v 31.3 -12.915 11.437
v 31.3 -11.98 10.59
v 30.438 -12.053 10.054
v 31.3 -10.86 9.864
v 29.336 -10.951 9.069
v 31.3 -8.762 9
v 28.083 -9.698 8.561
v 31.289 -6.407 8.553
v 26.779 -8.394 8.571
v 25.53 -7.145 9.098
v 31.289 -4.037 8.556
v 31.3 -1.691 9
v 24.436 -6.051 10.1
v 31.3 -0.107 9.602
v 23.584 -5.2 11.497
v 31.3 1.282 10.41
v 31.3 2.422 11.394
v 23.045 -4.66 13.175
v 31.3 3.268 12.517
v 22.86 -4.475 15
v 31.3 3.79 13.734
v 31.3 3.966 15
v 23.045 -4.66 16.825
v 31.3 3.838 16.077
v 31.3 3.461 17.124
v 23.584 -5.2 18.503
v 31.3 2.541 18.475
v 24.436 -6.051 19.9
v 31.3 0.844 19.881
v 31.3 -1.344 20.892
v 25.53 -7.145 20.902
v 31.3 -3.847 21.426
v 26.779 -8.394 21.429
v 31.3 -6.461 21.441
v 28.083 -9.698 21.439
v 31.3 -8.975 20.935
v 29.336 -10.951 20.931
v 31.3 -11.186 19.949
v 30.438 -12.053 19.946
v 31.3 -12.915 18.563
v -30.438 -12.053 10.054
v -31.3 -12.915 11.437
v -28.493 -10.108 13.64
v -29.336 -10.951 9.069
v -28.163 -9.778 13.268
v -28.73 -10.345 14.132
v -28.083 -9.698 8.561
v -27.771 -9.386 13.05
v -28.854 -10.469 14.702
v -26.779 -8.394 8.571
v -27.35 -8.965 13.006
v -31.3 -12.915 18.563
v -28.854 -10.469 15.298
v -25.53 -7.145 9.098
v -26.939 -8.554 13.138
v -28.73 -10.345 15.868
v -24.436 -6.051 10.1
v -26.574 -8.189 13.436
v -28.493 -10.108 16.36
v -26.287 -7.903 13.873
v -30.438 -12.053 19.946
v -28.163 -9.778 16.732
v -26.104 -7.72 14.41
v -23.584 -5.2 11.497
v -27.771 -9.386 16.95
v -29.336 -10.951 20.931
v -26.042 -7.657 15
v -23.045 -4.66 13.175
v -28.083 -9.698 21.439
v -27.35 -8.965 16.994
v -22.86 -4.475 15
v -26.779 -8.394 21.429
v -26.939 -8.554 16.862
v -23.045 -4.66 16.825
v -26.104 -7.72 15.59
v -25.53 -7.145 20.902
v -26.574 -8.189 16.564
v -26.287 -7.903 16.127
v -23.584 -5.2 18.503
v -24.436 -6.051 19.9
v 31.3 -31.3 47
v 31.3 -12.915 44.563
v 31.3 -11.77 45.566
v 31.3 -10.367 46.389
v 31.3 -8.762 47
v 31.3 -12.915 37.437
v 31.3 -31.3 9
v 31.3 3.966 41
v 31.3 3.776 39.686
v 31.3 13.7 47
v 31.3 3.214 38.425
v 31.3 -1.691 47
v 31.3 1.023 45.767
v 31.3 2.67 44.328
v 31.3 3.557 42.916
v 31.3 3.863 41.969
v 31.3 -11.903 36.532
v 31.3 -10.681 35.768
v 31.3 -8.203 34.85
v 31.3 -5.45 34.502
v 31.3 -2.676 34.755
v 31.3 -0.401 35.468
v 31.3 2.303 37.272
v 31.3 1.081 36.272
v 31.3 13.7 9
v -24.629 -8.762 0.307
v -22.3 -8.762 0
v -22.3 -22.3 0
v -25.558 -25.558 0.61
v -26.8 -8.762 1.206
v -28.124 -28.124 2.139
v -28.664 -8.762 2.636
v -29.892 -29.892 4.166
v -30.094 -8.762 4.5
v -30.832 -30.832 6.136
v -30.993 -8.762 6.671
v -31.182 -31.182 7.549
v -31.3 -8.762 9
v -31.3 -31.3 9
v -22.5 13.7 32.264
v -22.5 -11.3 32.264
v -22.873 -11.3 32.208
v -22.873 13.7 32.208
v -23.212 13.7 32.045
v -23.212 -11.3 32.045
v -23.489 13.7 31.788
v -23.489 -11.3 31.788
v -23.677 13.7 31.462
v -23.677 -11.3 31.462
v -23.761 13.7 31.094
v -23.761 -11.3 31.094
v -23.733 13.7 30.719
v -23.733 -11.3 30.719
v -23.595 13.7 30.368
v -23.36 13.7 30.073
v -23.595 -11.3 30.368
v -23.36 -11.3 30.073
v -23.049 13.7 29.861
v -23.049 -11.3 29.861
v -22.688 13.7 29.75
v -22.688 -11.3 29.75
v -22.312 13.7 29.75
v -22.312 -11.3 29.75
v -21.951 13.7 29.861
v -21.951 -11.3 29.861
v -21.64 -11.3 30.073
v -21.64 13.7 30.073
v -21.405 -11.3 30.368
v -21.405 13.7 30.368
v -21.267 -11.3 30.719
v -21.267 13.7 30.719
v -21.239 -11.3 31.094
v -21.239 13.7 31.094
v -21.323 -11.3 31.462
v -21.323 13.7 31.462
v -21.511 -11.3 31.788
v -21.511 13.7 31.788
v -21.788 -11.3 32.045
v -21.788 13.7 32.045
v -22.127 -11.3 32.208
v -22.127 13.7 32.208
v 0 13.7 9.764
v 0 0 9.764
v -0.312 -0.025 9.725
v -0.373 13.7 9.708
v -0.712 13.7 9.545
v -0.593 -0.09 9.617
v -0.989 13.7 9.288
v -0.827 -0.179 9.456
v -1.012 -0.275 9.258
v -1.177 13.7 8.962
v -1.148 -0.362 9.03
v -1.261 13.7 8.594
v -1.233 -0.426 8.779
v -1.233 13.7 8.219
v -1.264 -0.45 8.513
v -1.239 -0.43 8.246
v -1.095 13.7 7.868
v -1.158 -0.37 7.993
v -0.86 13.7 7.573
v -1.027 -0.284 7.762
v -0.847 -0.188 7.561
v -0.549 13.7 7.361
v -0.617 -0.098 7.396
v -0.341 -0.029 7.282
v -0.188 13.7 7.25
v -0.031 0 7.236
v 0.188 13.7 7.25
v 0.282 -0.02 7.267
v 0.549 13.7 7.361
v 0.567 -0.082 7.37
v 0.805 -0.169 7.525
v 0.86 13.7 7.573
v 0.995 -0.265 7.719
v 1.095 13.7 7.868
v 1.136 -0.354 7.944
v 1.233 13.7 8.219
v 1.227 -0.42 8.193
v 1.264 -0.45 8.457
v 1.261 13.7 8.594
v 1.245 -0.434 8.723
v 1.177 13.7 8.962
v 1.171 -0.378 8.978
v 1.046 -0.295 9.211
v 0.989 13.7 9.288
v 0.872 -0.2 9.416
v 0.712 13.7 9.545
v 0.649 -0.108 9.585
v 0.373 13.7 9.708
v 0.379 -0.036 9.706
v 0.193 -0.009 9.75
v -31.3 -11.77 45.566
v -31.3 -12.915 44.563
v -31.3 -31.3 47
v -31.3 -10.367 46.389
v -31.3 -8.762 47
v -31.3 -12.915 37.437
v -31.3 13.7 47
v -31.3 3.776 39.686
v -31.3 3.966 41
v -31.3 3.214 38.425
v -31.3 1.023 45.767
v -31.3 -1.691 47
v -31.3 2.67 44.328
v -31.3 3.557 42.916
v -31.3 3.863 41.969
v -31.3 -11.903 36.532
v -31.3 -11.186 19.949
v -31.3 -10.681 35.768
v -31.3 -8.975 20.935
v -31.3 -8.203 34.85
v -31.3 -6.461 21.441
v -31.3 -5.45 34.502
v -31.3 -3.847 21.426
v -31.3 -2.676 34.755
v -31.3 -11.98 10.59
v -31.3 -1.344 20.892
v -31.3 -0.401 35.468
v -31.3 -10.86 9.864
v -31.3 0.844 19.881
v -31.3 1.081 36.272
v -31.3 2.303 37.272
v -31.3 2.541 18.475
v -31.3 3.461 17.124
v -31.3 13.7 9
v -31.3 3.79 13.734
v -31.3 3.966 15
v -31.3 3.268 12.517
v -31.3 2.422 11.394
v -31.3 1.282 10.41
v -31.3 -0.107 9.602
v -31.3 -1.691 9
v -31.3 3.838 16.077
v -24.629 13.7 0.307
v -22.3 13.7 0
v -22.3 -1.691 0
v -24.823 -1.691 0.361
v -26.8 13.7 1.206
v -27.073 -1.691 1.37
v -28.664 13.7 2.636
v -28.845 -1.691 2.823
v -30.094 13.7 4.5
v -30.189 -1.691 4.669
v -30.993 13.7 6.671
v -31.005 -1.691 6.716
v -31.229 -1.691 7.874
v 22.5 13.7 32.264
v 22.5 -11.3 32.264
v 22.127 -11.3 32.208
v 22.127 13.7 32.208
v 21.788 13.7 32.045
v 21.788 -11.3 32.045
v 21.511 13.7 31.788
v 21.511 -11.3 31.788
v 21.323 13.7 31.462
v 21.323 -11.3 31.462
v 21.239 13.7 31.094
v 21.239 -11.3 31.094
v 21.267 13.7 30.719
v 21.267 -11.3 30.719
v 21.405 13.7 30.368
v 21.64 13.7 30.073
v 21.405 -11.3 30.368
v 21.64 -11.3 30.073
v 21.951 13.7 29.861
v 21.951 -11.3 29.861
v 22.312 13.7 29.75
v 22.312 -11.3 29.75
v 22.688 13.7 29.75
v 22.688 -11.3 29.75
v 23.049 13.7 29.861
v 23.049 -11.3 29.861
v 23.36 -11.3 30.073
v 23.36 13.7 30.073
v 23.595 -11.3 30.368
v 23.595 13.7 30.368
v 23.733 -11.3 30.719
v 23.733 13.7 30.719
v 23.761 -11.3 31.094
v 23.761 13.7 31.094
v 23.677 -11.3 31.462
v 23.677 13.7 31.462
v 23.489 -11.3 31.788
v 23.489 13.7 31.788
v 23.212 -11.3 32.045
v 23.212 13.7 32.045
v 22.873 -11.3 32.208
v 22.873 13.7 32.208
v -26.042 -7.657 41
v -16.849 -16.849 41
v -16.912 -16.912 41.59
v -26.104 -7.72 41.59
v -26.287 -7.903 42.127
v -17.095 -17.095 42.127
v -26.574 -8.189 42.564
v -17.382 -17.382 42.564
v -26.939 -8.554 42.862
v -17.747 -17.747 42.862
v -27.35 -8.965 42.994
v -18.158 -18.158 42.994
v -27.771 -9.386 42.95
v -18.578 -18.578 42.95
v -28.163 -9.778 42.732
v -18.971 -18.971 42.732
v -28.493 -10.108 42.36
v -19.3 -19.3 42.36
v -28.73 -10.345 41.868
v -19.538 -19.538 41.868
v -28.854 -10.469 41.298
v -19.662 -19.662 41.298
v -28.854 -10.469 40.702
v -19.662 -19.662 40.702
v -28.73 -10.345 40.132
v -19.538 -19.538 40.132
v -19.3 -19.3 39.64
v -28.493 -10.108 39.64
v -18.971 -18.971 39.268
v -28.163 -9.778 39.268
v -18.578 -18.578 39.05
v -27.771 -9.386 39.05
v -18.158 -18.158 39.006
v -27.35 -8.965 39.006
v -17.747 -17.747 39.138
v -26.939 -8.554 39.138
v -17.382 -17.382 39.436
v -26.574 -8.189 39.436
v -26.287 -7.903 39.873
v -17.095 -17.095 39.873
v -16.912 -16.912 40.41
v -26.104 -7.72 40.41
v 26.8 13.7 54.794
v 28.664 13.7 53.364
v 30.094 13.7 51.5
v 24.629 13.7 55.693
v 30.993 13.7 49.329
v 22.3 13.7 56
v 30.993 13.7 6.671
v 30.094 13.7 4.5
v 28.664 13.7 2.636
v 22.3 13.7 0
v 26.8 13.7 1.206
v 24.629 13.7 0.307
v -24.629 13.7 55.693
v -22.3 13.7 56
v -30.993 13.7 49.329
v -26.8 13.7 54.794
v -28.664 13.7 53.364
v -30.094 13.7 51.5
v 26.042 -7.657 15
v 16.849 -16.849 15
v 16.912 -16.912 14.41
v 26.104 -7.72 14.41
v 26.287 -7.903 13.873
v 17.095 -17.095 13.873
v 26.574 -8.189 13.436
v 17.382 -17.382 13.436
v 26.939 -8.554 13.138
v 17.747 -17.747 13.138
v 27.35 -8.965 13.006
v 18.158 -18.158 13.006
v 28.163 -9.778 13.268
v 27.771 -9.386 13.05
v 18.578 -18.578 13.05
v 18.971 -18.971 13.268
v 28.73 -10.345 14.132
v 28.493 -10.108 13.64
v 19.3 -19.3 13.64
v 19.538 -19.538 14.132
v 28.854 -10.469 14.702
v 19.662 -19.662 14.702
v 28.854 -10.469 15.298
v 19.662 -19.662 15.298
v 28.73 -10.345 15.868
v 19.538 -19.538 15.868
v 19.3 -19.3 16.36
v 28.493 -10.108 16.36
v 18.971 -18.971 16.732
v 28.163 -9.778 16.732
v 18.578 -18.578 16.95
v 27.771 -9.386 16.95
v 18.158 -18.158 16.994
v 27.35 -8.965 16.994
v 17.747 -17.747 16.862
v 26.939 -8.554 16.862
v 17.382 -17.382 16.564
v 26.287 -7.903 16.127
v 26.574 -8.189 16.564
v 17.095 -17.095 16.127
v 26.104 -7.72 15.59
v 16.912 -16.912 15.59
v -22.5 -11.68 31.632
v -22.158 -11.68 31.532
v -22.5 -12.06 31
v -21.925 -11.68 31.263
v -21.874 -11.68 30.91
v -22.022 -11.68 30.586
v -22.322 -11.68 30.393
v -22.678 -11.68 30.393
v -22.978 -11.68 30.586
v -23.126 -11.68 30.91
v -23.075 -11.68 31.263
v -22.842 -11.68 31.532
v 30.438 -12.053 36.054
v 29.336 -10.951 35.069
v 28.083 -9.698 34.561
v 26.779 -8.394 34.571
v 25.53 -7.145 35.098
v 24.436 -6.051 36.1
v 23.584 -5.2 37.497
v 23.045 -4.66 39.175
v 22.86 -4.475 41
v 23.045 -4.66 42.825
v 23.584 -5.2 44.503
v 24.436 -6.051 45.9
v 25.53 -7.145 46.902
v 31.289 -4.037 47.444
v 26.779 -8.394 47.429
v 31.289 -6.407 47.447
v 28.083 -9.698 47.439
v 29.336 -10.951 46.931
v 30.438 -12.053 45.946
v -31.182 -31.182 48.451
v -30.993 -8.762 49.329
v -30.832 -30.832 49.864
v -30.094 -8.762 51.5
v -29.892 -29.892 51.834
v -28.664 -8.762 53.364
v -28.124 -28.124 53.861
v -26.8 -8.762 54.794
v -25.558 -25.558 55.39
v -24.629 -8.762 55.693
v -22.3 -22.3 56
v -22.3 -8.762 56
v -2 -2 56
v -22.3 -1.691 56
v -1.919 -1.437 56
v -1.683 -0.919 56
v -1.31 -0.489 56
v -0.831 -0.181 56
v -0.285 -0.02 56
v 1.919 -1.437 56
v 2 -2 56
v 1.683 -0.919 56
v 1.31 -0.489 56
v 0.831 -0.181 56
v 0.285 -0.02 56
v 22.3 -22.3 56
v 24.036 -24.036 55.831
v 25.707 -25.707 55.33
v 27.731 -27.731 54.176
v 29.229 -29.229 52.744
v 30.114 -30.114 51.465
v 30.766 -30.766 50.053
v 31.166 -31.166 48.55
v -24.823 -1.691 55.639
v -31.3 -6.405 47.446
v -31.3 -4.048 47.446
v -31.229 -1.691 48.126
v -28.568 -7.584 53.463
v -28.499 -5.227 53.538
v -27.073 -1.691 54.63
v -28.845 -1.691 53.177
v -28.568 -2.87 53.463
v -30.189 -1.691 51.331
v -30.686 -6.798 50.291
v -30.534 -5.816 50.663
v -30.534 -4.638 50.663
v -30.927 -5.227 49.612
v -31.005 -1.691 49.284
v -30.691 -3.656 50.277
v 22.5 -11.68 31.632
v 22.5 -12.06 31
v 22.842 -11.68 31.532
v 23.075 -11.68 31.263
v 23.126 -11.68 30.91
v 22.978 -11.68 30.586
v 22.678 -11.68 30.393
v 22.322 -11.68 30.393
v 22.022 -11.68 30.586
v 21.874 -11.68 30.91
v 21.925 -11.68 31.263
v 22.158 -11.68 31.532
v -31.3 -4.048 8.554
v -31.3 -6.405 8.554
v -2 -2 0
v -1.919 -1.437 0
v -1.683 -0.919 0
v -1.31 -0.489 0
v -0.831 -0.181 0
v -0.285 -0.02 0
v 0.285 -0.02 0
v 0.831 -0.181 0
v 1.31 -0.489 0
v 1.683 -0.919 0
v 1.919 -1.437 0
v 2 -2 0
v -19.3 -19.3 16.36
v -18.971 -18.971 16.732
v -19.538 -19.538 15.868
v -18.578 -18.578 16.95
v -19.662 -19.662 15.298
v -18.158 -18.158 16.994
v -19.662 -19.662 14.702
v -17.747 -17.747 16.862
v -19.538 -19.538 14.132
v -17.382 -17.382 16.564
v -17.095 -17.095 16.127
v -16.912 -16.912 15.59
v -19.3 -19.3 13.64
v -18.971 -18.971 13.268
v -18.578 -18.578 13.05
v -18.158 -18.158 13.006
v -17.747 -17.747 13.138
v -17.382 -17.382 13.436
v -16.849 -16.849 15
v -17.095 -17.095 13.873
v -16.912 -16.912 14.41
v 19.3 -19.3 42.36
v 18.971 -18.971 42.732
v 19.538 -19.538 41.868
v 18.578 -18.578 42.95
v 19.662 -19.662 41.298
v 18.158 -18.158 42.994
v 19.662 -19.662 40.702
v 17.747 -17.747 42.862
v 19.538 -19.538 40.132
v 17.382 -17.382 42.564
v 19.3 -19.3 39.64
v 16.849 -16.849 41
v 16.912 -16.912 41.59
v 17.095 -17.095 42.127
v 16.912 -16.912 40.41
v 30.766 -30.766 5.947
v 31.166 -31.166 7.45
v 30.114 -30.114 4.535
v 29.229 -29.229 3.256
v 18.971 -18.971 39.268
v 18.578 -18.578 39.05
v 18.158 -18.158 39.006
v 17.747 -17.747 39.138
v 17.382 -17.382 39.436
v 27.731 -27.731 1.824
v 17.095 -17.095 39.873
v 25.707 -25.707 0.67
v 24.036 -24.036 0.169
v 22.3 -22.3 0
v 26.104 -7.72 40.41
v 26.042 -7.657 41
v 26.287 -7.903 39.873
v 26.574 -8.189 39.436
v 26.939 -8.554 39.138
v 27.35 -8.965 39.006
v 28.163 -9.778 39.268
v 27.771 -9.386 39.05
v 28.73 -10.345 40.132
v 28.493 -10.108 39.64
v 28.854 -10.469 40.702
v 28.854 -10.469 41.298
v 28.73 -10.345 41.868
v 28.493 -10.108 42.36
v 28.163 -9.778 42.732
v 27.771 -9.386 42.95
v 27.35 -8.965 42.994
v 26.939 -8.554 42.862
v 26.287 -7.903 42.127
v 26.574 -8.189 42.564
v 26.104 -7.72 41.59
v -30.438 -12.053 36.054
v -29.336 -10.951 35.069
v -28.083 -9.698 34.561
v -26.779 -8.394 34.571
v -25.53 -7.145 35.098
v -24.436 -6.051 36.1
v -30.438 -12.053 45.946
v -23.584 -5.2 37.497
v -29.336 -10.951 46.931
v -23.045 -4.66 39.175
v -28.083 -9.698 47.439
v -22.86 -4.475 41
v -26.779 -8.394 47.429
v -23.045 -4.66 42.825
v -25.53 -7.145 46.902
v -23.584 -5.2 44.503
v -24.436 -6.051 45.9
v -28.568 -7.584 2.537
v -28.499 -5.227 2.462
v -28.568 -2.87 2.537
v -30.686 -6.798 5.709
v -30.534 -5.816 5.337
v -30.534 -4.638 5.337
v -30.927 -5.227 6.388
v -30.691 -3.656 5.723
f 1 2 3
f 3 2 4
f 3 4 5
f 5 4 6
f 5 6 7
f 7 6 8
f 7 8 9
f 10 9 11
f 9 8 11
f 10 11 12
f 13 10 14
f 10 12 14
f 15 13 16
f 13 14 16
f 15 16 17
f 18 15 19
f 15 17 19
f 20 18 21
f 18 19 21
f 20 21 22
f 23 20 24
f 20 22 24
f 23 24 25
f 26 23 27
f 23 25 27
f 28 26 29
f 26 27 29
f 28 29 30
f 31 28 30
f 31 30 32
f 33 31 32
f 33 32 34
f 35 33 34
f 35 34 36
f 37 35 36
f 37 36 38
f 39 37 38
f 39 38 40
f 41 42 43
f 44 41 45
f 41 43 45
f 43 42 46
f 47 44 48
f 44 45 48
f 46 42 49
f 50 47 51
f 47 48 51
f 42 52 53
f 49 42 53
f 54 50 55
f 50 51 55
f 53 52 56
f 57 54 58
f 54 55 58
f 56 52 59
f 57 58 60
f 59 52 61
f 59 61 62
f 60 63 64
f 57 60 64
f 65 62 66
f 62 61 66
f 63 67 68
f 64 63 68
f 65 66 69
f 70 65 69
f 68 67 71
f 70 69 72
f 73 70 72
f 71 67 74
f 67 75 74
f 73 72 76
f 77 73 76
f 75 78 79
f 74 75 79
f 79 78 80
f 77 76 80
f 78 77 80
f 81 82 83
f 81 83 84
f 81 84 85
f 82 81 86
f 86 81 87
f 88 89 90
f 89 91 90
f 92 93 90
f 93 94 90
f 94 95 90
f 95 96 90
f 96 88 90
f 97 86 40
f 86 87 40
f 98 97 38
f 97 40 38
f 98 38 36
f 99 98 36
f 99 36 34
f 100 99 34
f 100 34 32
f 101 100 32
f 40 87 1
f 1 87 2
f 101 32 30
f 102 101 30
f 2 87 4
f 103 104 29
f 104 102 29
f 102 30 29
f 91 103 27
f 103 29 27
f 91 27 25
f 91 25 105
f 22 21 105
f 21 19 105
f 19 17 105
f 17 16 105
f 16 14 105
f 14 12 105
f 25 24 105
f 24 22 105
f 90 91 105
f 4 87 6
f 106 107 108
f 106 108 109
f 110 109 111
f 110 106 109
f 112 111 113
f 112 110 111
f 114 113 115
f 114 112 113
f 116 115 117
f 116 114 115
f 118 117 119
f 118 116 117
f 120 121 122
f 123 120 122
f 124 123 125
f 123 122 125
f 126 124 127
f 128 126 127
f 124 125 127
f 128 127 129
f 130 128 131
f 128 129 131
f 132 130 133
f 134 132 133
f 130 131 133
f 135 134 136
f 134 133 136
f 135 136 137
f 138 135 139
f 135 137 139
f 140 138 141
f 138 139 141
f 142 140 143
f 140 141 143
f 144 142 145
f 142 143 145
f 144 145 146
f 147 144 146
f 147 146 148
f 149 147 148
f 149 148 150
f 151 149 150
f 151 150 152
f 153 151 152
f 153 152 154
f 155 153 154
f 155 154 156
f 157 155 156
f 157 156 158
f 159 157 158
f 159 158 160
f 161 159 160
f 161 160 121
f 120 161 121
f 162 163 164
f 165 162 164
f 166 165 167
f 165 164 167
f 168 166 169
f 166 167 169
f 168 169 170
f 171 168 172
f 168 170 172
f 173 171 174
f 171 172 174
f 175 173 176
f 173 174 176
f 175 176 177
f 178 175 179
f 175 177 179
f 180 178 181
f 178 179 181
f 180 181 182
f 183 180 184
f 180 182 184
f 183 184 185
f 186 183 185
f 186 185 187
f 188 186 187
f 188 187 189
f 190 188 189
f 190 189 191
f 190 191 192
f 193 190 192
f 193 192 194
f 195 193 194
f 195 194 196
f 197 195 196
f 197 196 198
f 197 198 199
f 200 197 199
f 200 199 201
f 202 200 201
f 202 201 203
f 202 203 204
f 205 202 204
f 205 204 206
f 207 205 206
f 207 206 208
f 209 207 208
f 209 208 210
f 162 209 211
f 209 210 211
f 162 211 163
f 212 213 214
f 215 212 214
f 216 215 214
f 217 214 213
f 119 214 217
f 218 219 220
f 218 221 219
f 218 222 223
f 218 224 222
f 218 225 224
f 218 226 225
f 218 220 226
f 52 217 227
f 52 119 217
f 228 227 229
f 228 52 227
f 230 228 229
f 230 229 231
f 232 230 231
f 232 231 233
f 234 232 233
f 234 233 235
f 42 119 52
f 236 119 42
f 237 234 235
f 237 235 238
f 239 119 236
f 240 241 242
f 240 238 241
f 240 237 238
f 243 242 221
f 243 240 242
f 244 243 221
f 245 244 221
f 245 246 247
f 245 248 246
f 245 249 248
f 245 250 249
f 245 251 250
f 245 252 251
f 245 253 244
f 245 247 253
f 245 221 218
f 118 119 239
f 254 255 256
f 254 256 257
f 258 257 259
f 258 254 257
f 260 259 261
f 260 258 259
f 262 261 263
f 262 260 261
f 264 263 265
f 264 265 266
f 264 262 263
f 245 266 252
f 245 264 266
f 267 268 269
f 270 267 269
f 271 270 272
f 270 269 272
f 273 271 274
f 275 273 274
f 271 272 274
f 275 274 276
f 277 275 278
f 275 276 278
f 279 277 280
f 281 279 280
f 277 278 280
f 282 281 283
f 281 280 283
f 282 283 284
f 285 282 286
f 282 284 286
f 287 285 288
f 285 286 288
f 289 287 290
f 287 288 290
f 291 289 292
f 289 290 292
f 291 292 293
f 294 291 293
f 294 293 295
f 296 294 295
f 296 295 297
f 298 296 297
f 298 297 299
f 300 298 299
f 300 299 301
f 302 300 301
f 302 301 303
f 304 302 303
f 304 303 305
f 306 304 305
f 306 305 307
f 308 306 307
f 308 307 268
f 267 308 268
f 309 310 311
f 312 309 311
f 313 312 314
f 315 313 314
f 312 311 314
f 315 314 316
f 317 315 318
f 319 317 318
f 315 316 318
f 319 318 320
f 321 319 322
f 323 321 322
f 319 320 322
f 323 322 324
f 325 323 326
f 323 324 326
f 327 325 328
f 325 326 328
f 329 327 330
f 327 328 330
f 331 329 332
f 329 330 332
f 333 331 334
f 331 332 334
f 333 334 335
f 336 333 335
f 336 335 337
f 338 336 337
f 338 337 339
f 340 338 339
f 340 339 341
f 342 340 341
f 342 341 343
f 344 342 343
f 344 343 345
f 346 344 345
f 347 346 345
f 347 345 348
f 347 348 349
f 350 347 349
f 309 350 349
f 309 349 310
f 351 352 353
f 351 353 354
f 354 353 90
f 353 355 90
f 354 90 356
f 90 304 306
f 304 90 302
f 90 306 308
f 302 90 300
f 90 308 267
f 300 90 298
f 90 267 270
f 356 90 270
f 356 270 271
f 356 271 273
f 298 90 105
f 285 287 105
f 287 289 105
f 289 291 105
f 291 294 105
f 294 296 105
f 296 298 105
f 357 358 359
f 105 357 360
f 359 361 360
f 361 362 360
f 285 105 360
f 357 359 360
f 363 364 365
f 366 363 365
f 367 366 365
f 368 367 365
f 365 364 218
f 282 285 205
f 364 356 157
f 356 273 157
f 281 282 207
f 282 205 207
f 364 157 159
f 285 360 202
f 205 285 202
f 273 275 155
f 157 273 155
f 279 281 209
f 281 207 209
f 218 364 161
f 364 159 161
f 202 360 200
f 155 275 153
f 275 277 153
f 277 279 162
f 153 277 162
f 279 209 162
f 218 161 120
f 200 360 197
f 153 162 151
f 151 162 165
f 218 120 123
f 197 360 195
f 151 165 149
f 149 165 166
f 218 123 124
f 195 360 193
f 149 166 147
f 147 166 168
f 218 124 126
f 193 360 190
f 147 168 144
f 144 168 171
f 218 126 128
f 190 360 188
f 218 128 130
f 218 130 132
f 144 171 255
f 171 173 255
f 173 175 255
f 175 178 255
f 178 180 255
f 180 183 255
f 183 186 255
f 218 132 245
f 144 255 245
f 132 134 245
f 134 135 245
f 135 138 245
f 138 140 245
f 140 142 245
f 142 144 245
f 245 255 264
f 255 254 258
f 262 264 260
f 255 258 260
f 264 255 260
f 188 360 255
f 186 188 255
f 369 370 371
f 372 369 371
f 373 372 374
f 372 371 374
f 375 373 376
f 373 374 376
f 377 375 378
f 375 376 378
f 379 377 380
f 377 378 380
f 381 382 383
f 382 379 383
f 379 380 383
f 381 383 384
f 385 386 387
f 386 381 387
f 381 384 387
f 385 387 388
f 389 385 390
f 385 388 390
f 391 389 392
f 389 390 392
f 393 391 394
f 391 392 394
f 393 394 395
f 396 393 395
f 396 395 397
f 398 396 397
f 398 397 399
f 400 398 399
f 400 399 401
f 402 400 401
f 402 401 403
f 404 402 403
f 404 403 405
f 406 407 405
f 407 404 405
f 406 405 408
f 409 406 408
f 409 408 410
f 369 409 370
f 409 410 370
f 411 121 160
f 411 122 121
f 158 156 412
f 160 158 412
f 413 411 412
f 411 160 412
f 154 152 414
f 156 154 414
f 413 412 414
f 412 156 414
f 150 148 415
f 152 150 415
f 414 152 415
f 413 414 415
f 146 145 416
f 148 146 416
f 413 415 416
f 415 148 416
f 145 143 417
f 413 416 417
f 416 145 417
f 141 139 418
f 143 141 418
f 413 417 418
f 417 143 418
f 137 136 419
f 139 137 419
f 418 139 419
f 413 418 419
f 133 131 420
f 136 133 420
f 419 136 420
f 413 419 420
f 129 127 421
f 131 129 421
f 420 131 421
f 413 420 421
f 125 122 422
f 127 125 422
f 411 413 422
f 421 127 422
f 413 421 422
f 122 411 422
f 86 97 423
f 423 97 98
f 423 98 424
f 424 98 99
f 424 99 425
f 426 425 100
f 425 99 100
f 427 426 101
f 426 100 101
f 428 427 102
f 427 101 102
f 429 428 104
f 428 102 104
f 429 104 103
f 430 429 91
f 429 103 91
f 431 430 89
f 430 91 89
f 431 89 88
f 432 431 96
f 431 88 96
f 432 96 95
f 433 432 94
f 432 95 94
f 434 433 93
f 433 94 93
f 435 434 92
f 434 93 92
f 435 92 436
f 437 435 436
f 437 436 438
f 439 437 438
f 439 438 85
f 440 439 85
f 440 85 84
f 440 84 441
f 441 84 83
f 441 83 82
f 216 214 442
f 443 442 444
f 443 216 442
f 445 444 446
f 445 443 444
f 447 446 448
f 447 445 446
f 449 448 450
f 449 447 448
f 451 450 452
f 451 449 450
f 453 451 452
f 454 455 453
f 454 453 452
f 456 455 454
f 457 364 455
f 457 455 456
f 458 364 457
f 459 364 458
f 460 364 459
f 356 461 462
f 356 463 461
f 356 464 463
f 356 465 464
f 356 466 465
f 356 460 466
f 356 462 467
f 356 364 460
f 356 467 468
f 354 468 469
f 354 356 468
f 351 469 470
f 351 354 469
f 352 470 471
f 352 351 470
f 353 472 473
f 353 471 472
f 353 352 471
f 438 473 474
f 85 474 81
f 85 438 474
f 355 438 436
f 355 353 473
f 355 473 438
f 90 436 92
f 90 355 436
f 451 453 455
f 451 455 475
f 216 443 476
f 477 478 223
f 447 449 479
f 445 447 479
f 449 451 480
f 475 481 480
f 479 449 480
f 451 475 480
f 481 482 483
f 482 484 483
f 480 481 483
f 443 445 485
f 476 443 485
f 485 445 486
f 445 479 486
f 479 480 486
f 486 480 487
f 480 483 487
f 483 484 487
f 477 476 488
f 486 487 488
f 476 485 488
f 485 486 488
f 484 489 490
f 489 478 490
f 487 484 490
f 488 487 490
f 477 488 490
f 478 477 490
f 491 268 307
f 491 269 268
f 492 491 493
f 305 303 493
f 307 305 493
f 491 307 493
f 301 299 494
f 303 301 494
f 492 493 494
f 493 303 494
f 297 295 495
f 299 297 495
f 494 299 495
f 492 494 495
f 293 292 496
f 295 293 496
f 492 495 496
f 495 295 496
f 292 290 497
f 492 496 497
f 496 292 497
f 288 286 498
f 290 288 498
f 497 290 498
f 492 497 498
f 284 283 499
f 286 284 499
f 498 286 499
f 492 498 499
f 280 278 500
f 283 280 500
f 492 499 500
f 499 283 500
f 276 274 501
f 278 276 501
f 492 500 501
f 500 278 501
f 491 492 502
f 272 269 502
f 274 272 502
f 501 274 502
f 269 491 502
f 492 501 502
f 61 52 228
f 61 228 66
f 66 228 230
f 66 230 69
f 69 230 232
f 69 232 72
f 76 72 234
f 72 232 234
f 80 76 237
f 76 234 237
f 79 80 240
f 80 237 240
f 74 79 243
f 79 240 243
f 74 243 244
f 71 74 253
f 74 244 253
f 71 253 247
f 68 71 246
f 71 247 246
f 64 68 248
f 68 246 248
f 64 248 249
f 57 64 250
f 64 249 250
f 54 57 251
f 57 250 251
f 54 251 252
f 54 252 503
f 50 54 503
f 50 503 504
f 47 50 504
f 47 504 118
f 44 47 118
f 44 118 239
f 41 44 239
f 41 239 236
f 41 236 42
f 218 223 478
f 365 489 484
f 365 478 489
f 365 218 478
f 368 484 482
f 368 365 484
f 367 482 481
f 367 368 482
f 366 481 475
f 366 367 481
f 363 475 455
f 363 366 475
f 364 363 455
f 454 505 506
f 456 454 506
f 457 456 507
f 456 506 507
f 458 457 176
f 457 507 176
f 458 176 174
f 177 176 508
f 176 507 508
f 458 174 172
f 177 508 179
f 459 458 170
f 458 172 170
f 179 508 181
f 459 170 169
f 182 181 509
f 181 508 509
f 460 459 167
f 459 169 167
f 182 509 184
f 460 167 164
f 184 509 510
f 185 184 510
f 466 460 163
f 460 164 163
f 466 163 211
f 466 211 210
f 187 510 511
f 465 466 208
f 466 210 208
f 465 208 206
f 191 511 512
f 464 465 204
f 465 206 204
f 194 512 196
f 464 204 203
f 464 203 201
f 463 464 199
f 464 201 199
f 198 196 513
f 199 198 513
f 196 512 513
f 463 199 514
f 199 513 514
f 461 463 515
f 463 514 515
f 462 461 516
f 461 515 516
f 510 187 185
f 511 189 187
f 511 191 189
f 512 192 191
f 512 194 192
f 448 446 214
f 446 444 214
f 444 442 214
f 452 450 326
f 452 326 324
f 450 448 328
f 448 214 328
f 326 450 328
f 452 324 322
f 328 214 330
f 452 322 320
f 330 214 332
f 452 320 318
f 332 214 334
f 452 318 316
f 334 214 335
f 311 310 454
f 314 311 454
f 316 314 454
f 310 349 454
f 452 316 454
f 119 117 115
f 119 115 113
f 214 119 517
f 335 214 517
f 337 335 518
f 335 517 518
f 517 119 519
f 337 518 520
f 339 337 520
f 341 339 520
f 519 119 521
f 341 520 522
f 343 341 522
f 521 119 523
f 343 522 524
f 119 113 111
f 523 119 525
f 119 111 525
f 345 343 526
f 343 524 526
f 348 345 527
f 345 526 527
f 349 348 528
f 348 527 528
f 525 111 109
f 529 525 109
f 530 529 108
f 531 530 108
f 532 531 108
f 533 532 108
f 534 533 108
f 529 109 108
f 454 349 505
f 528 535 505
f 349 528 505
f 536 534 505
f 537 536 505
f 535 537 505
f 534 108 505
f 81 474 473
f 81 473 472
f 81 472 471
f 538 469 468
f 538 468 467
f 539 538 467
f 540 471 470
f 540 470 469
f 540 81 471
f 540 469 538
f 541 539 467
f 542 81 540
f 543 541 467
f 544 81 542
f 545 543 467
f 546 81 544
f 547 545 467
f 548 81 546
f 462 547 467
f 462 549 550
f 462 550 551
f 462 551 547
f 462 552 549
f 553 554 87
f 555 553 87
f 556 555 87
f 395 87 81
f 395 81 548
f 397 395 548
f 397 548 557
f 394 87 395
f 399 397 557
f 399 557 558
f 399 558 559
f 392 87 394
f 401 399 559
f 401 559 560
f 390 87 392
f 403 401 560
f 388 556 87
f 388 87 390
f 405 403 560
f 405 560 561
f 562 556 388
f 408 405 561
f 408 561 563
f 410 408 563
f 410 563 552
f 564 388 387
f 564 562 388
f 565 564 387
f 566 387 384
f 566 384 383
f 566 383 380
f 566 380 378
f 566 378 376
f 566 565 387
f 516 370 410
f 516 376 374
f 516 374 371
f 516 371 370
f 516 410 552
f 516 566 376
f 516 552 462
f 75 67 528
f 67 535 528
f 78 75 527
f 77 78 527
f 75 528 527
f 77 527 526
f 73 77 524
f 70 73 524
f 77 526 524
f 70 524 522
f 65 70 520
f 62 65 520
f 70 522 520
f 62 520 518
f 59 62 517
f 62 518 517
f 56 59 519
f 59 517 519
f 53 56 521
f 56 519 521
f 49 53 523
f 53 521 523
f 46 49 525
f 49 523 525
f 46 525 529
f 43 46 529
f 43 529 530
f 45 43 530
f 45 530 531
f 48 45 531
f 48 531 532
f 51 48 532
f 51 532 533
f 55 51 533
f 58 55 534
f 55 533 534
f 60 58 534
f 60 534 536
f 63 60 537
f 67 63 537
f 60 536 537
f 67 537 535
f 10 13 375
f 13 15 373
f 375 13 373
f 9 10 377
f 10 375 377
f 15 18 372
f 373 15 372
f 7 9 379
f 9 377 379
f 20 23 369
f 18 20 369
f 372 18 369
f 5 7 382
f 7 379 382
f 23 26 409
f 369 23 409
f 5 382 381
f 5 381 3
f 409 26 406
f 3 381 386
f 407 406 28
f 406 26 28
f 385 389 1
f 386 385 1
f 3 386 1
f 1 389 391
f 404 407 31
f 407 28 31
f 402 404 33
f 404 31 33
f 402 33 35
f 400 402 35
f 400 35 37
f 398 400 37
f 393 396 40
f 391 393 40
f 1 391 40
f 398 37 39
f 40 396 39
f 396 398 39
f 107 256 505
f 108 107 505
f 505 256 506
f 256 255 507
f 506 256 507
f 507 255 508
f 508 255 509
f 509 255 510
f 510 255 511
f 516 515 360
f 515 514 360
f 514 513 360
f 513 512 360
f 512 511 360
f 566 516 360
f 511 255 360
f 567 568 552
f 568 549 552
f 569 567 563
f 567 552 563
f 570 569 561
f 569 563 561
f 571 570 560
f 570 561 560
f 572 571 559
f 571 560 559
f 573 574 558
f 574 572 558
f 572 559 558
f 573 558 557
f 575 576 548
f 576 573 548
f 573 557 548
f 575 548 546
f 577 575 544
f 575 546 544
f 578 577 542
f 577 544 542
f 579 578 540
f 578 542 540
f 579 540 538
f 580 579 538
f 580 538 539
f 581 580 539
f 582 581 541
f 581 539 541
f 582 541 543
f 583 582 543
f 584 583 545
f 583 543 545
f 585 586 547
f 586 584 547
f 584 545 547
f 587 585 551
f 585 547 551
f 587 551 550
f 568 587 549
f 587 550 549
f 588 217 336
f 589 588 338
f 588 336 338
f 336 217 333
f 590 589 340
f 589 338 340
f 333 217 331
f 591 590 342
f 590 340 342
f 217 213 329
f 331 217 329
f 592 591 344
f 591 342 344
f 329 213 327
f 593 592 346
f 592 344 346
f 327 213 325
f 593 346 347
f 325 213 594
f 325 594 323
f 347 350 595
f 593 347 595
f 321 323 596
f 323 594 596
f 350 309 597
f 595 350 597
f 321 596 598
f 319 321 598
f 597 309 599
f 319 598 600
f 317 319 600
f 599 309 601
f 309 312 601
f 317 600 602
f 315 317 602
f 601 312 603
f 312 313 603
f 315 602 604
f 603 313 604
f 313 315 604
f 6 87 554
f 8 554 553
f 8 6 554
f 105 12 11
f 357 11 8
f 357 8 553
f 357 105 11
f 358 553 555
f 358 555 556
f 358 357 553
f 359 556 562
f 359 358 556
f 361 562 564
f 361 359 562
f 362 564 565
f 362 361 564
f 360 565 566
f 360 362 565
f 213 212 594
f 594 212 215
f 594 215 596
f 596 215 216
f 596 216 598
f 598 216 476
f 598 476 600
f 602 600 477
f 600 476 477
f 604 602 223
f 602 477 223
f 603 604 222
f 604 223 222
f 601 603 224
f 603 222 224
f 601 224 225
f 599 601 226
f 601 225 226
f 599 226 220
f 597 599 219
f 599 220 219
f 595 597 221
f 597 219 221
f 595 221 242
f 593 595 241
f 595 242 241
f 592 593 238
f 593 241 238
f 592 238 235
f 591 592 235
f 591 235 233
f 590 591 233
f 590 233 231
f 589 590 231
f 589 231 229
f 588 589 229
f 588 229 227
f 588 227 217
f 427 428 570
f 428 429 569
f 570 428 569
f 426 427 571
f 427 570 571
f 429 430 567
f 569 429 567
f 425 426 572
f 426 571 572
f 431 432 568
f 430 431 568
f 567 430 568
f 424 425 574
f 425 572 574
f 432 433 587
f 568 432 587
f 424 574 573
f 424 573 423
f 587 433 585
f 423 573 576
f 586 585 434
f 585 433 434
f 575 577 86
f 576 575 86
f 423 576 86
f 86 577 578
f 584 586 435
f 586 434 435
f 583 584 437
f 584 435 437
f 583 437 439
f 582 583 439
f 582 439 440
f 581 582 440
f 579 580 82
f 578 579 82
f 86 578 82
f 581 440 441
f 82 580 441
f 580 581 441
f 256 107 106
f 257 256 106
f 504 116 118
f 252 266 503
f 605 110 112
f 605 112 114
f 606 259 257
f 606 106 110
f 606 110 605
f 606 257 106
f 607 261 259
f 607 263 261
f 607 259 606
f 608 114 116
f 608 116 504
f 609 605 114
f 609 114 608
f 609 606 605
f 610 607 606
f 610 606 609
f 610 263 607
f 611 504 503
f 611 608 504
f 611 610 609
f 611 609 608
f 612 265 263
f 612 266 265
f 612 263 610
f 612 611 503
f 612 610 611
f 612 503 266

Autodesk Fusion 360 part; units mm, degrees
sketch "Sketch1" plane through (0, 0, 0) normal (0, 0, 1) x (1, 0, 0)
  line L0 (0, 0) -> (0, -37.5335) construction
  line L1 (31.3, -31.3) -> (31.3, 13.7)
  line L2 (31.3, -31.3) -> (2, -2)
  line L3 (-31.3, -31.3) -> (-31.3, 13.7)
  line L4 (-31.3, -31.3) -> (-2, -2)
  line L5 (31.3, 13.7) -> (-31.3, 13.7)
  arc A0 (2, -2) -> (-2, -2) centre (0, -2) ccw
  dimension "d1" = 62.6
  dimension "d2" = 45
  dimension "d4" = 90
  dimension "d5" = 2
extrude "Extrude1" add sketch "Sketch1" along normal blind 56
sketch "Sketch2" plane through (0, 0, 0) normal (0.7071, -0.7071, 0) x (0.7071, 0.7071, 0)
  line L0 (-44.2649, 0) -> (-2.8284, 0)
  line L1 (-2.8284, 0) -> (-2.8284, 56)
  line L2 (-2.8284, 56) -> (-44.2649, 56)
  line L3 (-44.2649, 56) -> (-44.2649, 0)
  circle A0 centre (-25.8284, 41) radius 2
  circle A1 centre (-25.8284, 15) radius 2
  circle A2 centre (-25.8284, 15) radius 6.5
  circle A3 centre (-25.8284, 41) radius 6.5
  dimension "d8" = 15
  dimension "d10" = 4
  dimension "d11" = 15
  dimension "d12" = 23
  dimension "d15" = 13
extrude "Extrude2" cut sketch "Sketch2" against normal blind 61.002 contours A0 | A1
extrude "Extrude3" cut sketch "Sketch2" along normal blind 17 from surface at -30 contours A2 | A3
sketch "Sketch3" plane through (0, 13.7, 0) normal (0, 1, 0) x (-1, 0, 0)
  line L0 (-31.3, 0) -> (31.3, 0)
  line L1 (31.3, 0) -> (31.3, 56)
  line L2 (31.3, 56) -> (-31.3, 56)
  line L3 (-31.3, 56) -> (-31.3, 0)
  line L4 (0, 56) -> (0, 42.8245) construction
  circle A0 centre (-22.5, 31) radius 1.5
  circle A1 centre (22.5, 31) radius 1.5
  circle A2 centre (0, 8.5) radius 1.5
  dimension "d19" = 25
  dimension "d20" = 45
  dimension "d21" = 3
  dimension "d30" = 8.5
hole "Hole1" at (22.5, 13.7, 31) at (-22.5, 13.7, 31) at (0, 13.7, 8.5) direction (0, -1, 0) diameter 2.529 depth 25 tip angle 118
fillet "Fillet1" radius 9 4 edges at (31.3, -8.8, 56) (-31.3, -8.8, 56) (-31.3, -8.8, 0) (31.3, -8.8, 0)
mirror "Mirror1" about plane through (0, 0, 0) normal (1, 0, 0) of "Extrude2", "Extrude3"
equation "d11 = d8"
